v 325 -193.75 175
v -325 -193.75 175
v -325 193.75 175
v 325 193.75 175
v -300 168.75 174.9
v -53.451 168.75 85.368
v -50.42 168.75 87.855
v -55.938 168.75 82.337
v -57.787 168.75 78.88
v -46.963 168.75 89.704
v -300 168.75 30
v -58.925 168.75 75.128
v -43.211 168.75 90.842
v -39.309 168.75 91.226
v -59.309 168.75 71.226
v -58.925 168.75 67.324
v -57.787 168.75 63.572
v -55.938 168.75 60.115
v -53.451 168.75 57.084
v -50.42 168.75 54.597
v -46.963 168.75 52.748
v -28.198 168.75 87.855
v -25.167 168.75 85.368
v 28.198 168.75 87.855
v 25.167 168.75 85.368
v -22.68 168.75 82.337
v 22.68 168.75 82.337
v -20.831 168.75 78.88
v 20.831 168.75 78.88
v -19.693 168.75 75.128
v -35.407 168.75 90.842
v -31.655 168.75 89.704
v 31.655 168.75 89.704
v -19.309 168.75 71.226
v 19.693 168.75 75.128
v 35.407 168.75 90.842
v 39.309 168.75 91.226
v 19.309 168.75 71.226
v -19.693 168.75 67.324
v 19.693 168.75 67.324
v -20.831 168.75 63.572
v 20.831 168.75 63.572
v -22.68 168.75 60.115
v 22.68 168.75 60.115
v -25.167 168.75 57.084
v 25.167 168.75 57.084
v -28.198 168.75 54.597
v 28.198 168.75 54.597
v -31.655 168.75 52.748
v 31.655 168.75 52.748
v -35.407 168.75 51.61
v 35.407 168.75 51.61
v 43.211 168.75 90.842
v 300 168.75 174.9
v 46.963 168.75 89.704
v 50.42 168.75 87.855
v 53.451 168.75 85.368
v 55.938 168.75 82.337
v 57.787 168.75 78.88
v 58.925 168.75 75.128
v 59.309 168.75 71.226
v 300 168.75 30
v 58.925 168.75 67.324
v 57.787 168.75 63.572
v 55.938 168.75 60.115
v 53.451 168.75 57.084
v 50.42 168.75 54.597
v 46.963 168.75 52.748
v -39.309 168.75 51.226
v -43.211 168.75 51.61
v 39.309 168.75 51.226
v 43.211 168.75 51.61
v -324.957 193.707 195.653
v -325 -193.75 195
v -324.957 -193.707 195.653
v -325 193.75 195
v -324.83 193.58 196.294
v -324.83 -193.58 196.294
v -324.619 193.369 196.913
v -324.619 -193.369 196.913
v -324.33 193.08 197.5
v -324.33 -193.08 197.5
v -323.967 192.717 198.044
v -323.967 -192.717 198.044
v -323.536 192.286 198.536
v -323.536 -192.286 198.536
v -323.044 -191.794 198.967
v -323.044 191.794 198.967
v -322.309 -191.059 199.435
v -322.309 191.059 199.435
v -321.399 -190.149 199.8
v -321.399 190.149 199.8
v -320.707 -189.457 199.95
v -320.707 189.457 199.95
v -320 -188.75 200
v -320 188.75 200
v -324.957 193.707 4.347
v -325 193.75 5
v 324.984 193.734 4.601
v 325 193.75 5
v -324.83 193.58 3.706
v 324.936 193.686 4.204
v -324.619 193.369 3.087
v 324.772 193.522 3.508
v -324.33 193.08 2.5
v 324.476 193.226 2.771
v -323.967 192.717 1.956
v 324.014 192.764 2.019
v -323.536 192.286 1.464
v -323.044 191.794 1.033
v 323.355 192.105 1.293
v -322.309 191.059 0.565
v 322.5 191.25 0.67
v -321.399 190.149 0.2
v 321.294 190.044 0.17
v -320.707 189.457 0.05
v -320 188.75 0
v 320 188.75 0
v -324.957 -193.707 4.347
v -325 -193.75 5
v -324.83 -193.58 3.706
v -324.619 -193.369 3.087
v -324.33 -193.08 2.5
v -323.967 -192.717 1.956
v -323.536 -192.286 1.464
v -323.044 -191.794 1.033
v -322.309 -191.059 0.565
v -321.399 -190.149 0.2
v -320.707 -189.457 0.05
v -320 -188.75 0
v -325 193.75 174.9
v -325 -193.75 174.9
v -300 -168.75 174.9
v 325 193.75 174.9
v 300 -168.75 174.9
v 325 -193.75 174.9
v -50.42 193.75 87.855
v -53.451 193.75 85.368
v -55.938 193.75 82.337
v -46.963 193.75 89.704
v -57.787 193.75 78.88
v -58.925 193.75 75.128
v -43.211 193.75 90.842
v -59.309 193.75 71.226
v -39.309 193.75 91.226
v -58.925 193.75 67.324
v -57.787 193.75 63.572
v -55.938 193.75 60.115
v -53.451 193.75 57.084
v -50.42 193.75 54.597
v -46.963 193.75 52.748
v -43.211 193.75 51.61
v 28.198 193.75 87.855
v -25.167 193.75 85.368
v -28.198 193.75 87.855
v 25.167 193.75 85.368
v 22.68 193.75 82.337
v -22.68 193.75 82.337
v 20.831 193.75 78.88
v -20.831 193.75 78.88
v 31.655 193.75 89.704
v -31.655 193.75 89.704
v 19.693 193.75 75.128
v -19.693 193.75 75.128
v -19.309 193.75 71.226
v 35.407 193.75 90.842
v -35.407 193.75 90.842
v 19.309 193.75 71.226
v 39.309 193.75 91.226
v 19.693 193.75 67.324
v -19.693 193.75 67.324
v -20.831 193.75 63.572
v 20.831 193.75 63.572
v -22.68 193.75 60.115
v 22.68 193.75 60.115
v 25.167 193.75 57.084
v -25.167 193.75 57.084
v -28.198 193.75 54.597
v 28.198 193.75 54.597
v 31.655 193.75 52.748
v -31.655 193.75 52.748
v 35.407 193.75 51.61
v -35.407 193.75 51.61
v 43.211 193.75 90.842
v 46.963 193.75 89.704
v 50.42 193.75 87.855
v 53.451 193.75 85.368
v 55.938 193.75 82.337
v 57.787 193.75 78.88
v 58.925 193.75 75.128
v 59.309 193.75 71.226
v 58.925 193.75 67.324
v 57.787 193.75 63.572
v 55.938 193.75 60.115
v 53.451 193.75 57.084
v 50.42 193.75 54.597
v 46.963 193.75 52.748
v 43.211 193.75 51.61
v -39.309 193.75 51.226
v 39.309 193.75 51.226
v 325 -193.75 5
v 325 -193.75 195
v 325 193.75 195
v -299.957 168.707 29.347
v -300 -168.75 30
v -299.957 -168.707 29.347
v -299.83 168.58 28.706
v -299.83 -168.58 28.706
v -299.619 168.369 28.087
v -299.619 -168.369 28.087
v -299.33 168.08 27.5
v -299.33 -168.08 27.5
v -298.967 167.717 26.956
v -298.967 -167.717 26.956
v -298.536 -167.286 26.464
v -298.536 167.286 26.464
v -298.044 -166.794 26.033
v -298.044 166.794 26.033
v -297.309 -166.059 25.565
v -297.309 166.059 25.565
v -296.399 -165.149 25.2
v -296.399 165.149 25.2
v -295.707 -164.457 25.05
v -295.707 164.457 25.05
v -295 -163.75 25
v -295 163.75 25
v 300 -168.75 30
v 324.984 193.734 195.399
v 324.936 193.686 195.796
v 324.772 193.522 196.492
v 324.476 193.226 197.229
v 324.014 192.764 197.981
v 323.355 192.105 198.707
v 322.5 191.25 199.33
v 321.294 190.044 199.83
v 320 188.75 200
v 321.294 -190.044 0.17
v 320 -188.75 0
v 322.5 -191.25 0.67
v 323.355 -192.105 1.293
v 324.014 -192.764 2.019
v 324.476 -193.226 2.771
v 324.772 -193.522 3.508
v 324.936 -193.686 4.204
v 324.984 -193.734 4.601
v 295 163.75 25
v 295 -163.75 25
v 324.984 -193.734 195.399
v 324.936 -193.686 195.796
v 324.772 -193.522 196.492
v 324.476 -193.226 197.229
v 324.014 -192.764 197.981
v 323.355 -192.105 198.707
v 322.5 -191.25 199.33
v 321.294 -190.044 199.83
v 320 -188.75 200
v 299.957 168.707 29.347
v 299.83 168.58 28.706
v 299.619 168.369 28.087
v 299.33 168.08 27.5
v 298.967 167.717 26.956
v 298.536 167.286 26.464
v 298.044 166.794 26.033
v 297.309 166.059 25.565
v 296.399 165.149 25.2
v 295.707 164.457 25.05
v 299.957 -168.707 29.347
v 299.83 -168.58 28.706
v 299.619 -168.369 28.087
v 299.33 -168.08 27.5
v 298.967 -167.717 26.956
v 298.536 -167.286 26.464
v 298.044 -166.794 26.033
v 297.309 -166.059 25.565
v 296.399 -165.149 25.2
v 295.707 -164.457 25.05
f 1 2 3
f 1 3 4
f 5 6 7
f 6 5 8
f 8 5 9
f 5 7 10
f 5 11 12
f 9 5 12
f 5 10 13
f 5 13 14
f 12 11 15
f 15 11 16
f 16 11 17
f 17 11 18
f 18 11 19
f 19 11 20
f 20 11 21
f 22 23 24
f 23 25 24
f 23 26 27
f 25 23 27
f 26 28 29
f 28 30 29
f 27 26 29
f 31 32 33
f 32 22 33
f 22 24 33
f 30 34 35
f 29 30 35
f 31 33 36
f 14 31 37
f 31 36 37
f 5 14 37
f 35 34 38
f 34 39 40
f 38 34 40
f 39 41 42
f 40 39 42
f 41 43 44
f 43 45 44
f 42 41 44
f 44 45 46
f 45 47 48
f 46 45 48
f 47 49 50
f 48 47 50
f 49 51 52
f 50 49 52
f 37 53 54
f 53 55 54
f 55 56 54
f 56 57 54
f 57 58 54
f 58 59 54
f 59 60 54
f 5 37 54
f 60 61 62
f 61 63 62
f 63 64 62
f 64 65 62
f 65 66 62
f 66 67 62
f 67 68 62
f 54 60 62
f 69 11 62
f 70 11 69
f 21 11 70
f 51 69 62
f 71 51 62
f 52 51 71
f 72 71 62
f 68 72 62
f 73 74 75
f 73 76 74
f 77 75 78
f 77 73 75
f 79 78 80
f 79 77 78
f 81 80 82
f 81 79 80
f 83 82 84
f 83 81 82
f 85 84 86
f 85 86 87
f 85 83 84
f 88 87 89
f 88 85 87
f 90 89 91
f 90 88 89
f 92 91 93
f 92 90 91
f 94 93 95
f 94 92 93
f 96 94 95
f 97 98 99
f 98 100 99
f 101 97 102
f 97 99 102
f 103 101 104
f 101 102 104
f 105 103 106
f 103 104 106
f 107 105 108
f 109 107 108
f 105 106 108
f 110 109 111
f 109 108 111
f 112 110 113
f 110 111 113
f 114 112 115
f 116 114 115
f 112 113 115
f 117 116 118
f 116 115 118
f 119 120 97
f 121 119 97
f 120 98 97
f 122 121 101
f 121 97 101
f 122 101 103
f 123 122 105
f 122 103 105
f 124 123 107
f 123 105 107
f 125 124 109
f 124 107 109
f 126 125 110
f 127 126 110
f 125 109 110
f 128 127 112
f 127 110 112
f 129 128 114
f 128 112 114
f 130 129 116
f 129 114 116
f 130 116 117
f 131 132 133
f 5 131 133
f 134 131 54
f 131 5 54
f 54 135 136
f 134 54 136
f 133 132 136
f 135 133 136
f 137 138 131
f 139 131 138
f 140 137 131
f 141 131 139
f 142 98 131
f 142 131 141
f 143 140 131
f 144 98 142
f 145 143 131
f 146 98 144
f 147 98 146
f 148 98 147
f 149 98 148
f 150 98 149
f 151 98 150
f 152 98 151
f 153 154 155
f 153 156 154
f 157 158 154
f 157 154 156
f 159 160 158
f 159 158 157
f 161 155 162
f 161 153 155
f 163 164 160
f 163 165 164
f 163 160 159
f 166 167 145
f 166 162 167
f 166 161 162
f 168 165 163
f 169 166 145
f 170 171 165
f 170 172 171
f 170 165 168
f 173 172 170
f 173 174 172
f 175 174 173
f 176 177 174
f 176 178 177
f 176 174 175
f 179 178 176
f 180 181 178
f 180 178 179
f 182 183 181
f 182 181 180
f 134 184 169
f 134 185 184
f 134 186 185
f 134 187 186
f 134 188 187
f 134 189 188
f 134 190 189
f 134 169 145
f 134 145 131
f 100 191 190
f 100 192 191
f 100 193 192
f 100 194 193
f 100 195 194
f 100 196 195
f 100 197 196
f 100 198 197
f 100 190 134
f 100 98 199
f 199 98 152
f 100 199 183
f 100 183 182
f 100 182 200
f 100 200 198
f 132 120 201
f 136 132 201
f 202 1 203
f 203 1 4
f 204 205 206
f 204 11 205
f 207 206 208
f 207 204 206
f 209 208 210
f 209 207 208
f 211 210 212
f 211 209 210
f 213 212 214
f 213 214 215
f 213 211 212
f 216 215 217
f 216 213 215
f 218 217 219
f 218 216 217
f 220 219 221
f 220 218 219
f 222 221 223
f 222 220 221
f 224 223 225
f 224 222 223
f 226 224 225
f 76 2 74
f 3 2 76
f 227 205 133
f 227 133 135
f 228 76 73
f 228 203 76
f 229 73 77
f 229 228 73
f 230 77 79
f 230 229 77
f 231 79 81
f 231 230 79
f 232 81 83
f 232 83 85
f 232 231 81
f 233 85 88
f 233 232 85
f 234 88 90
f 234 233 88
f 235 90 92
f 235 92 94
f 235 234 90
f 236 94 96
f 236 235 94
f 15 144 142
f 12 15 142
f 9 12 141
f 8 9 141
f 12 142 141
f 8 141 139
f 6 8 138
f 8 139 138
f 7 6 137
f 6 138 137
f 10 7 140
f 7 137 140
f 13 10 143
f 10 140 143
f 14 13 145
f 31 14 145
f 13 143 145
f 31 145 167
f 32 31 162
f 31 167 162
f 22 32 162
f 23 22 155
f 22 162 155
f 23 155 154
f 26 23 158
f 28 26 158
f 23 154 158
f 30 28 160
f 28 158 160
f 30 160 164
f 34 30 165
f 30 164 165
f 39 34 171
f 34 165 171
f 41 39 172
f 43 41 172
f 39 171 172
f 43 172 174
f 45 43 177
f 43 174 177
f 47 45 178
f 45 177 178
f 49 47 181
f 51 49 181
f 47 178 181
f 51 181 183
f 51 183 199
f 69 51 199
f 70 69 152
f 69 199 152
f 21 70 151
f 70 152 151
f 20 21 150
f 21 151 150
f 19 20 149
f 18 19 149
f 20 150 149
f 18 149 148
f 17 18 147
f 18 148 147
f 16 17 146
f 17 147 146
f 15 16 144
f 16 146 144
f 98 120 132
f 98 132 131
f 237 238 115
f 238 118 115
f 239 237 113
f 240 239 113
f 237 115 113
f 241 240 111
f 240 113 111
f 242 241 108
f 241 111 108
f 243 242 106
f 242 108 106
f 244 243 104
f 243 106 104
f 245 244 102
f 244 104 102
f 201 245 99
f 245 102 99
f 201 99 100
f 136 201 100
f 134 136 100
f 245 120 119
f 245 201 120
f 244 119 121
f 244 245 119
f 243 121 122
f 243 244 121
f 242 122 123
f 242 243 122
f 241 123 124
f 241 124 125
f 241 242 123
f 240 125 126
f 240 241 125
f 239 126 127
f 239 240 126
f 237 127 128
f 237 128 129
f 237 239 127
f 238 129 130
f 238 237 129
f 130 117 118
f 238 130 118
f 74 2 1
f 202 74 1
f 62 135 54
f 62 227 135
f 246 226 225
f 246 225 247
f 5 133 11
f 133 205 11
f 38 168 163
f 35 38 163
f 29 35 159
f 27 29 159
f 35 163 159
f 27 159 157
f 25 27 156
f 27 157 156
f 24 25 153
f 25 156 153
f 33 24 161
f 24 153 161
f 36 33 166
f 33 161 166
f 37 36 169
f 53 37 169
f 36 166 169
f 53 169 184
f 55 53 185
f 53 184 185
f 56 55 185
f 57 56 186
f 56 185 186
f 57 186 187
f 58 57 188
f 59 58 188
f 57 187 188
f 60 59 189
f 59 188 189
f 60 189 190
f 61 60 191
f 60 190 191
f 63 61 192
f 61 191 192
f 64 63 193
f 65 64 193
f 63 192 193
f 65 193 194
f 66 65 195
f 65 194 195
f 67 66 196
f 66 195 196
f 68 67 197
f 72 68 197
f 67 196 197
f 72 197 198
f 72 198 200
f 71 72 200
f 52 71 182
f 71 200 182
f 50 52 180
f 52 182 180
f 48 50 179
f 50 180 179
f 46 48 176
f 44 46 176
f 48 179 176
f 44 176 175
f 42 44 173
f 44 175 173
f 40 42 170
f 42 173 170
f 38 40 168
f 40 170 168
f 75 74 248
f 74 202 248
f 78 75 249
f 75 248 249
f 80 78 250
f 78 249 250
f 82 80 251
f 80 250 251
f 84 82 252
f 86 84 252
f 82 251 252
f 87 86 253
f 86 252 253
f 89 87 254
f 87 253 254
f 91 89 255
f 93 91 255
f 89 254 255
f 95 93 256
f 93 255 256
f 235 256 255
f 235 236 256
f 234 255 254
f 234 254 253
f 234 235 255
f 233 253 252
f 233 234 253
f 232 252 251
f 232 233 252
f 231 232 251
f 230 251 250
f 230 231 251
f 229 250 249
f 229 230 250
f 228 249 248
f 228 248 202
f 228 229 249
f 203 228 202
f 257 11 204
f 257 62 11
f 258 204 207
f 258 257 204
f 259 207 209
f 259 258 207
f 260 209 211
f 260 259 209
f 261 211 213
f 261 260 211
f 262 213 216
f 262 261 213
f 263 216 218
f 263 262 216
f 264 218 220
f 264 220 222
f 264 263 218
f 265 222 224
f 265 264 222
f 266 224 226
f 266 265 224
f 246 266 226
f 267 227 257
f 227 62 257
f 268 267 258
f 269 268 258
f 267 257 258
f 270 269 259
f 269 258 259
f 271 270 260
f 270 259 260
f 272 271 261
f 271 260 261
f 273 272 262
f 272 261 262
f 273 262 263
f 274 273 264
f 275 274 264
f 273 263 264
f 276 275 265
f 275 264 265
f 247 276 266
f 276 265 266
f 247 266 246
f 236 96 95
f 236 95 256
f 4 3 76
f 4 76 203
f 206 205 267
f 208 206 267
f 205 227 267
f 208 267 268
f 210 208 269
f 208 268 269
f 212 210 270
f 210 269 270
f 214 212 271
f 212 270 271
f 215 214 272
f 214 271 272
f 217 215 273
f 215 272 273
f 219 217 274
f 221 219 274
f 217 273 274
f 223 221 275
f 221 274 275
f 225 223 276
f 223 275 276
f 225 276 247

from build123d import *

# Parameters (mm, degrees)
F0_W     = 650
F0_H     = 387.5
F1_DEPTH = 200
F2_T     = -25
F3_R     = 20
F4_DEPTH = 25
F5_R     = 5
F6_W     = 756.5549731451
F6_H     = 0.1
F7_DEPTH = 500
F8_W     = 610
F8_H     = 347.5
F9_DEPTH = 25


with BuildPart() as f1:
    # F0 (on Top) → F1 (new body)
    with BuildSketch(Plane.XY):
        Rectangle(F0_W, F0_H)
    extrude(amount=F1_DEPTH)

    # F2
    f2_openings = [f1.faces().sort_by_distance(p)[0] for p in [
        (0, 0, 200),
    ]]
    offset(amount=F2_T, openings=f2_openings)

    # F3 (on face) → F4 (cut)
    with BuildSketch(Plane(origin=(0, 193.75, 0), x_dir=(-1, 0, 0), z_dir=(0, 1, 0))):
        with Locations((-39.309, 71.226)):
            Circle(F3_R)
        with Locations((39.309, 71.226)):
            Circle(F3_R)
    extrude(amount=-F4_DEPTH, mode=Mode.SUBTRACT)

    # F5
    f5_edges = [f1.edges().sort_by_distance(p)[0] for p in [
        (300, 0, 25),
        (0, 168.75, 25),
        (-300, 0, 25),
        (0, -168.75, 25),
        (325, 0, 200),
        (0, 193.75, 200),
        (-325, 0, 200),
        (0, -193.75, 200),
        (300, 0, 200),
        (0, -168.75, 200),
        (-300, 0, 200),
        (0, 168.75, 200),
        (325, 0, 0),
        (0, 193.75, 0),
        (-325, 0, 0),
        (0, -193.75, 0),
    ]]
    fillet(f5_edges, radius=F5_R)

    # F6 (on face) → F7 (cut)
    with BuildSketch(Plane.XZ.offset(193.75)):
        with Locations((24.6878415346, 174.95)):
            Rectangle(F6_W, F6_H)
    extrude(amount=-F7_DEPTH, mode=Mode.SUBTRACT)

    # F8 (on face) → F9 (join)
    with BuildSketch(Plane.XY.offset(200)):
        Rectangle(F8_W, F8_H)
    extrude(amount=-F9_DEPTH)


solid = f1.part
